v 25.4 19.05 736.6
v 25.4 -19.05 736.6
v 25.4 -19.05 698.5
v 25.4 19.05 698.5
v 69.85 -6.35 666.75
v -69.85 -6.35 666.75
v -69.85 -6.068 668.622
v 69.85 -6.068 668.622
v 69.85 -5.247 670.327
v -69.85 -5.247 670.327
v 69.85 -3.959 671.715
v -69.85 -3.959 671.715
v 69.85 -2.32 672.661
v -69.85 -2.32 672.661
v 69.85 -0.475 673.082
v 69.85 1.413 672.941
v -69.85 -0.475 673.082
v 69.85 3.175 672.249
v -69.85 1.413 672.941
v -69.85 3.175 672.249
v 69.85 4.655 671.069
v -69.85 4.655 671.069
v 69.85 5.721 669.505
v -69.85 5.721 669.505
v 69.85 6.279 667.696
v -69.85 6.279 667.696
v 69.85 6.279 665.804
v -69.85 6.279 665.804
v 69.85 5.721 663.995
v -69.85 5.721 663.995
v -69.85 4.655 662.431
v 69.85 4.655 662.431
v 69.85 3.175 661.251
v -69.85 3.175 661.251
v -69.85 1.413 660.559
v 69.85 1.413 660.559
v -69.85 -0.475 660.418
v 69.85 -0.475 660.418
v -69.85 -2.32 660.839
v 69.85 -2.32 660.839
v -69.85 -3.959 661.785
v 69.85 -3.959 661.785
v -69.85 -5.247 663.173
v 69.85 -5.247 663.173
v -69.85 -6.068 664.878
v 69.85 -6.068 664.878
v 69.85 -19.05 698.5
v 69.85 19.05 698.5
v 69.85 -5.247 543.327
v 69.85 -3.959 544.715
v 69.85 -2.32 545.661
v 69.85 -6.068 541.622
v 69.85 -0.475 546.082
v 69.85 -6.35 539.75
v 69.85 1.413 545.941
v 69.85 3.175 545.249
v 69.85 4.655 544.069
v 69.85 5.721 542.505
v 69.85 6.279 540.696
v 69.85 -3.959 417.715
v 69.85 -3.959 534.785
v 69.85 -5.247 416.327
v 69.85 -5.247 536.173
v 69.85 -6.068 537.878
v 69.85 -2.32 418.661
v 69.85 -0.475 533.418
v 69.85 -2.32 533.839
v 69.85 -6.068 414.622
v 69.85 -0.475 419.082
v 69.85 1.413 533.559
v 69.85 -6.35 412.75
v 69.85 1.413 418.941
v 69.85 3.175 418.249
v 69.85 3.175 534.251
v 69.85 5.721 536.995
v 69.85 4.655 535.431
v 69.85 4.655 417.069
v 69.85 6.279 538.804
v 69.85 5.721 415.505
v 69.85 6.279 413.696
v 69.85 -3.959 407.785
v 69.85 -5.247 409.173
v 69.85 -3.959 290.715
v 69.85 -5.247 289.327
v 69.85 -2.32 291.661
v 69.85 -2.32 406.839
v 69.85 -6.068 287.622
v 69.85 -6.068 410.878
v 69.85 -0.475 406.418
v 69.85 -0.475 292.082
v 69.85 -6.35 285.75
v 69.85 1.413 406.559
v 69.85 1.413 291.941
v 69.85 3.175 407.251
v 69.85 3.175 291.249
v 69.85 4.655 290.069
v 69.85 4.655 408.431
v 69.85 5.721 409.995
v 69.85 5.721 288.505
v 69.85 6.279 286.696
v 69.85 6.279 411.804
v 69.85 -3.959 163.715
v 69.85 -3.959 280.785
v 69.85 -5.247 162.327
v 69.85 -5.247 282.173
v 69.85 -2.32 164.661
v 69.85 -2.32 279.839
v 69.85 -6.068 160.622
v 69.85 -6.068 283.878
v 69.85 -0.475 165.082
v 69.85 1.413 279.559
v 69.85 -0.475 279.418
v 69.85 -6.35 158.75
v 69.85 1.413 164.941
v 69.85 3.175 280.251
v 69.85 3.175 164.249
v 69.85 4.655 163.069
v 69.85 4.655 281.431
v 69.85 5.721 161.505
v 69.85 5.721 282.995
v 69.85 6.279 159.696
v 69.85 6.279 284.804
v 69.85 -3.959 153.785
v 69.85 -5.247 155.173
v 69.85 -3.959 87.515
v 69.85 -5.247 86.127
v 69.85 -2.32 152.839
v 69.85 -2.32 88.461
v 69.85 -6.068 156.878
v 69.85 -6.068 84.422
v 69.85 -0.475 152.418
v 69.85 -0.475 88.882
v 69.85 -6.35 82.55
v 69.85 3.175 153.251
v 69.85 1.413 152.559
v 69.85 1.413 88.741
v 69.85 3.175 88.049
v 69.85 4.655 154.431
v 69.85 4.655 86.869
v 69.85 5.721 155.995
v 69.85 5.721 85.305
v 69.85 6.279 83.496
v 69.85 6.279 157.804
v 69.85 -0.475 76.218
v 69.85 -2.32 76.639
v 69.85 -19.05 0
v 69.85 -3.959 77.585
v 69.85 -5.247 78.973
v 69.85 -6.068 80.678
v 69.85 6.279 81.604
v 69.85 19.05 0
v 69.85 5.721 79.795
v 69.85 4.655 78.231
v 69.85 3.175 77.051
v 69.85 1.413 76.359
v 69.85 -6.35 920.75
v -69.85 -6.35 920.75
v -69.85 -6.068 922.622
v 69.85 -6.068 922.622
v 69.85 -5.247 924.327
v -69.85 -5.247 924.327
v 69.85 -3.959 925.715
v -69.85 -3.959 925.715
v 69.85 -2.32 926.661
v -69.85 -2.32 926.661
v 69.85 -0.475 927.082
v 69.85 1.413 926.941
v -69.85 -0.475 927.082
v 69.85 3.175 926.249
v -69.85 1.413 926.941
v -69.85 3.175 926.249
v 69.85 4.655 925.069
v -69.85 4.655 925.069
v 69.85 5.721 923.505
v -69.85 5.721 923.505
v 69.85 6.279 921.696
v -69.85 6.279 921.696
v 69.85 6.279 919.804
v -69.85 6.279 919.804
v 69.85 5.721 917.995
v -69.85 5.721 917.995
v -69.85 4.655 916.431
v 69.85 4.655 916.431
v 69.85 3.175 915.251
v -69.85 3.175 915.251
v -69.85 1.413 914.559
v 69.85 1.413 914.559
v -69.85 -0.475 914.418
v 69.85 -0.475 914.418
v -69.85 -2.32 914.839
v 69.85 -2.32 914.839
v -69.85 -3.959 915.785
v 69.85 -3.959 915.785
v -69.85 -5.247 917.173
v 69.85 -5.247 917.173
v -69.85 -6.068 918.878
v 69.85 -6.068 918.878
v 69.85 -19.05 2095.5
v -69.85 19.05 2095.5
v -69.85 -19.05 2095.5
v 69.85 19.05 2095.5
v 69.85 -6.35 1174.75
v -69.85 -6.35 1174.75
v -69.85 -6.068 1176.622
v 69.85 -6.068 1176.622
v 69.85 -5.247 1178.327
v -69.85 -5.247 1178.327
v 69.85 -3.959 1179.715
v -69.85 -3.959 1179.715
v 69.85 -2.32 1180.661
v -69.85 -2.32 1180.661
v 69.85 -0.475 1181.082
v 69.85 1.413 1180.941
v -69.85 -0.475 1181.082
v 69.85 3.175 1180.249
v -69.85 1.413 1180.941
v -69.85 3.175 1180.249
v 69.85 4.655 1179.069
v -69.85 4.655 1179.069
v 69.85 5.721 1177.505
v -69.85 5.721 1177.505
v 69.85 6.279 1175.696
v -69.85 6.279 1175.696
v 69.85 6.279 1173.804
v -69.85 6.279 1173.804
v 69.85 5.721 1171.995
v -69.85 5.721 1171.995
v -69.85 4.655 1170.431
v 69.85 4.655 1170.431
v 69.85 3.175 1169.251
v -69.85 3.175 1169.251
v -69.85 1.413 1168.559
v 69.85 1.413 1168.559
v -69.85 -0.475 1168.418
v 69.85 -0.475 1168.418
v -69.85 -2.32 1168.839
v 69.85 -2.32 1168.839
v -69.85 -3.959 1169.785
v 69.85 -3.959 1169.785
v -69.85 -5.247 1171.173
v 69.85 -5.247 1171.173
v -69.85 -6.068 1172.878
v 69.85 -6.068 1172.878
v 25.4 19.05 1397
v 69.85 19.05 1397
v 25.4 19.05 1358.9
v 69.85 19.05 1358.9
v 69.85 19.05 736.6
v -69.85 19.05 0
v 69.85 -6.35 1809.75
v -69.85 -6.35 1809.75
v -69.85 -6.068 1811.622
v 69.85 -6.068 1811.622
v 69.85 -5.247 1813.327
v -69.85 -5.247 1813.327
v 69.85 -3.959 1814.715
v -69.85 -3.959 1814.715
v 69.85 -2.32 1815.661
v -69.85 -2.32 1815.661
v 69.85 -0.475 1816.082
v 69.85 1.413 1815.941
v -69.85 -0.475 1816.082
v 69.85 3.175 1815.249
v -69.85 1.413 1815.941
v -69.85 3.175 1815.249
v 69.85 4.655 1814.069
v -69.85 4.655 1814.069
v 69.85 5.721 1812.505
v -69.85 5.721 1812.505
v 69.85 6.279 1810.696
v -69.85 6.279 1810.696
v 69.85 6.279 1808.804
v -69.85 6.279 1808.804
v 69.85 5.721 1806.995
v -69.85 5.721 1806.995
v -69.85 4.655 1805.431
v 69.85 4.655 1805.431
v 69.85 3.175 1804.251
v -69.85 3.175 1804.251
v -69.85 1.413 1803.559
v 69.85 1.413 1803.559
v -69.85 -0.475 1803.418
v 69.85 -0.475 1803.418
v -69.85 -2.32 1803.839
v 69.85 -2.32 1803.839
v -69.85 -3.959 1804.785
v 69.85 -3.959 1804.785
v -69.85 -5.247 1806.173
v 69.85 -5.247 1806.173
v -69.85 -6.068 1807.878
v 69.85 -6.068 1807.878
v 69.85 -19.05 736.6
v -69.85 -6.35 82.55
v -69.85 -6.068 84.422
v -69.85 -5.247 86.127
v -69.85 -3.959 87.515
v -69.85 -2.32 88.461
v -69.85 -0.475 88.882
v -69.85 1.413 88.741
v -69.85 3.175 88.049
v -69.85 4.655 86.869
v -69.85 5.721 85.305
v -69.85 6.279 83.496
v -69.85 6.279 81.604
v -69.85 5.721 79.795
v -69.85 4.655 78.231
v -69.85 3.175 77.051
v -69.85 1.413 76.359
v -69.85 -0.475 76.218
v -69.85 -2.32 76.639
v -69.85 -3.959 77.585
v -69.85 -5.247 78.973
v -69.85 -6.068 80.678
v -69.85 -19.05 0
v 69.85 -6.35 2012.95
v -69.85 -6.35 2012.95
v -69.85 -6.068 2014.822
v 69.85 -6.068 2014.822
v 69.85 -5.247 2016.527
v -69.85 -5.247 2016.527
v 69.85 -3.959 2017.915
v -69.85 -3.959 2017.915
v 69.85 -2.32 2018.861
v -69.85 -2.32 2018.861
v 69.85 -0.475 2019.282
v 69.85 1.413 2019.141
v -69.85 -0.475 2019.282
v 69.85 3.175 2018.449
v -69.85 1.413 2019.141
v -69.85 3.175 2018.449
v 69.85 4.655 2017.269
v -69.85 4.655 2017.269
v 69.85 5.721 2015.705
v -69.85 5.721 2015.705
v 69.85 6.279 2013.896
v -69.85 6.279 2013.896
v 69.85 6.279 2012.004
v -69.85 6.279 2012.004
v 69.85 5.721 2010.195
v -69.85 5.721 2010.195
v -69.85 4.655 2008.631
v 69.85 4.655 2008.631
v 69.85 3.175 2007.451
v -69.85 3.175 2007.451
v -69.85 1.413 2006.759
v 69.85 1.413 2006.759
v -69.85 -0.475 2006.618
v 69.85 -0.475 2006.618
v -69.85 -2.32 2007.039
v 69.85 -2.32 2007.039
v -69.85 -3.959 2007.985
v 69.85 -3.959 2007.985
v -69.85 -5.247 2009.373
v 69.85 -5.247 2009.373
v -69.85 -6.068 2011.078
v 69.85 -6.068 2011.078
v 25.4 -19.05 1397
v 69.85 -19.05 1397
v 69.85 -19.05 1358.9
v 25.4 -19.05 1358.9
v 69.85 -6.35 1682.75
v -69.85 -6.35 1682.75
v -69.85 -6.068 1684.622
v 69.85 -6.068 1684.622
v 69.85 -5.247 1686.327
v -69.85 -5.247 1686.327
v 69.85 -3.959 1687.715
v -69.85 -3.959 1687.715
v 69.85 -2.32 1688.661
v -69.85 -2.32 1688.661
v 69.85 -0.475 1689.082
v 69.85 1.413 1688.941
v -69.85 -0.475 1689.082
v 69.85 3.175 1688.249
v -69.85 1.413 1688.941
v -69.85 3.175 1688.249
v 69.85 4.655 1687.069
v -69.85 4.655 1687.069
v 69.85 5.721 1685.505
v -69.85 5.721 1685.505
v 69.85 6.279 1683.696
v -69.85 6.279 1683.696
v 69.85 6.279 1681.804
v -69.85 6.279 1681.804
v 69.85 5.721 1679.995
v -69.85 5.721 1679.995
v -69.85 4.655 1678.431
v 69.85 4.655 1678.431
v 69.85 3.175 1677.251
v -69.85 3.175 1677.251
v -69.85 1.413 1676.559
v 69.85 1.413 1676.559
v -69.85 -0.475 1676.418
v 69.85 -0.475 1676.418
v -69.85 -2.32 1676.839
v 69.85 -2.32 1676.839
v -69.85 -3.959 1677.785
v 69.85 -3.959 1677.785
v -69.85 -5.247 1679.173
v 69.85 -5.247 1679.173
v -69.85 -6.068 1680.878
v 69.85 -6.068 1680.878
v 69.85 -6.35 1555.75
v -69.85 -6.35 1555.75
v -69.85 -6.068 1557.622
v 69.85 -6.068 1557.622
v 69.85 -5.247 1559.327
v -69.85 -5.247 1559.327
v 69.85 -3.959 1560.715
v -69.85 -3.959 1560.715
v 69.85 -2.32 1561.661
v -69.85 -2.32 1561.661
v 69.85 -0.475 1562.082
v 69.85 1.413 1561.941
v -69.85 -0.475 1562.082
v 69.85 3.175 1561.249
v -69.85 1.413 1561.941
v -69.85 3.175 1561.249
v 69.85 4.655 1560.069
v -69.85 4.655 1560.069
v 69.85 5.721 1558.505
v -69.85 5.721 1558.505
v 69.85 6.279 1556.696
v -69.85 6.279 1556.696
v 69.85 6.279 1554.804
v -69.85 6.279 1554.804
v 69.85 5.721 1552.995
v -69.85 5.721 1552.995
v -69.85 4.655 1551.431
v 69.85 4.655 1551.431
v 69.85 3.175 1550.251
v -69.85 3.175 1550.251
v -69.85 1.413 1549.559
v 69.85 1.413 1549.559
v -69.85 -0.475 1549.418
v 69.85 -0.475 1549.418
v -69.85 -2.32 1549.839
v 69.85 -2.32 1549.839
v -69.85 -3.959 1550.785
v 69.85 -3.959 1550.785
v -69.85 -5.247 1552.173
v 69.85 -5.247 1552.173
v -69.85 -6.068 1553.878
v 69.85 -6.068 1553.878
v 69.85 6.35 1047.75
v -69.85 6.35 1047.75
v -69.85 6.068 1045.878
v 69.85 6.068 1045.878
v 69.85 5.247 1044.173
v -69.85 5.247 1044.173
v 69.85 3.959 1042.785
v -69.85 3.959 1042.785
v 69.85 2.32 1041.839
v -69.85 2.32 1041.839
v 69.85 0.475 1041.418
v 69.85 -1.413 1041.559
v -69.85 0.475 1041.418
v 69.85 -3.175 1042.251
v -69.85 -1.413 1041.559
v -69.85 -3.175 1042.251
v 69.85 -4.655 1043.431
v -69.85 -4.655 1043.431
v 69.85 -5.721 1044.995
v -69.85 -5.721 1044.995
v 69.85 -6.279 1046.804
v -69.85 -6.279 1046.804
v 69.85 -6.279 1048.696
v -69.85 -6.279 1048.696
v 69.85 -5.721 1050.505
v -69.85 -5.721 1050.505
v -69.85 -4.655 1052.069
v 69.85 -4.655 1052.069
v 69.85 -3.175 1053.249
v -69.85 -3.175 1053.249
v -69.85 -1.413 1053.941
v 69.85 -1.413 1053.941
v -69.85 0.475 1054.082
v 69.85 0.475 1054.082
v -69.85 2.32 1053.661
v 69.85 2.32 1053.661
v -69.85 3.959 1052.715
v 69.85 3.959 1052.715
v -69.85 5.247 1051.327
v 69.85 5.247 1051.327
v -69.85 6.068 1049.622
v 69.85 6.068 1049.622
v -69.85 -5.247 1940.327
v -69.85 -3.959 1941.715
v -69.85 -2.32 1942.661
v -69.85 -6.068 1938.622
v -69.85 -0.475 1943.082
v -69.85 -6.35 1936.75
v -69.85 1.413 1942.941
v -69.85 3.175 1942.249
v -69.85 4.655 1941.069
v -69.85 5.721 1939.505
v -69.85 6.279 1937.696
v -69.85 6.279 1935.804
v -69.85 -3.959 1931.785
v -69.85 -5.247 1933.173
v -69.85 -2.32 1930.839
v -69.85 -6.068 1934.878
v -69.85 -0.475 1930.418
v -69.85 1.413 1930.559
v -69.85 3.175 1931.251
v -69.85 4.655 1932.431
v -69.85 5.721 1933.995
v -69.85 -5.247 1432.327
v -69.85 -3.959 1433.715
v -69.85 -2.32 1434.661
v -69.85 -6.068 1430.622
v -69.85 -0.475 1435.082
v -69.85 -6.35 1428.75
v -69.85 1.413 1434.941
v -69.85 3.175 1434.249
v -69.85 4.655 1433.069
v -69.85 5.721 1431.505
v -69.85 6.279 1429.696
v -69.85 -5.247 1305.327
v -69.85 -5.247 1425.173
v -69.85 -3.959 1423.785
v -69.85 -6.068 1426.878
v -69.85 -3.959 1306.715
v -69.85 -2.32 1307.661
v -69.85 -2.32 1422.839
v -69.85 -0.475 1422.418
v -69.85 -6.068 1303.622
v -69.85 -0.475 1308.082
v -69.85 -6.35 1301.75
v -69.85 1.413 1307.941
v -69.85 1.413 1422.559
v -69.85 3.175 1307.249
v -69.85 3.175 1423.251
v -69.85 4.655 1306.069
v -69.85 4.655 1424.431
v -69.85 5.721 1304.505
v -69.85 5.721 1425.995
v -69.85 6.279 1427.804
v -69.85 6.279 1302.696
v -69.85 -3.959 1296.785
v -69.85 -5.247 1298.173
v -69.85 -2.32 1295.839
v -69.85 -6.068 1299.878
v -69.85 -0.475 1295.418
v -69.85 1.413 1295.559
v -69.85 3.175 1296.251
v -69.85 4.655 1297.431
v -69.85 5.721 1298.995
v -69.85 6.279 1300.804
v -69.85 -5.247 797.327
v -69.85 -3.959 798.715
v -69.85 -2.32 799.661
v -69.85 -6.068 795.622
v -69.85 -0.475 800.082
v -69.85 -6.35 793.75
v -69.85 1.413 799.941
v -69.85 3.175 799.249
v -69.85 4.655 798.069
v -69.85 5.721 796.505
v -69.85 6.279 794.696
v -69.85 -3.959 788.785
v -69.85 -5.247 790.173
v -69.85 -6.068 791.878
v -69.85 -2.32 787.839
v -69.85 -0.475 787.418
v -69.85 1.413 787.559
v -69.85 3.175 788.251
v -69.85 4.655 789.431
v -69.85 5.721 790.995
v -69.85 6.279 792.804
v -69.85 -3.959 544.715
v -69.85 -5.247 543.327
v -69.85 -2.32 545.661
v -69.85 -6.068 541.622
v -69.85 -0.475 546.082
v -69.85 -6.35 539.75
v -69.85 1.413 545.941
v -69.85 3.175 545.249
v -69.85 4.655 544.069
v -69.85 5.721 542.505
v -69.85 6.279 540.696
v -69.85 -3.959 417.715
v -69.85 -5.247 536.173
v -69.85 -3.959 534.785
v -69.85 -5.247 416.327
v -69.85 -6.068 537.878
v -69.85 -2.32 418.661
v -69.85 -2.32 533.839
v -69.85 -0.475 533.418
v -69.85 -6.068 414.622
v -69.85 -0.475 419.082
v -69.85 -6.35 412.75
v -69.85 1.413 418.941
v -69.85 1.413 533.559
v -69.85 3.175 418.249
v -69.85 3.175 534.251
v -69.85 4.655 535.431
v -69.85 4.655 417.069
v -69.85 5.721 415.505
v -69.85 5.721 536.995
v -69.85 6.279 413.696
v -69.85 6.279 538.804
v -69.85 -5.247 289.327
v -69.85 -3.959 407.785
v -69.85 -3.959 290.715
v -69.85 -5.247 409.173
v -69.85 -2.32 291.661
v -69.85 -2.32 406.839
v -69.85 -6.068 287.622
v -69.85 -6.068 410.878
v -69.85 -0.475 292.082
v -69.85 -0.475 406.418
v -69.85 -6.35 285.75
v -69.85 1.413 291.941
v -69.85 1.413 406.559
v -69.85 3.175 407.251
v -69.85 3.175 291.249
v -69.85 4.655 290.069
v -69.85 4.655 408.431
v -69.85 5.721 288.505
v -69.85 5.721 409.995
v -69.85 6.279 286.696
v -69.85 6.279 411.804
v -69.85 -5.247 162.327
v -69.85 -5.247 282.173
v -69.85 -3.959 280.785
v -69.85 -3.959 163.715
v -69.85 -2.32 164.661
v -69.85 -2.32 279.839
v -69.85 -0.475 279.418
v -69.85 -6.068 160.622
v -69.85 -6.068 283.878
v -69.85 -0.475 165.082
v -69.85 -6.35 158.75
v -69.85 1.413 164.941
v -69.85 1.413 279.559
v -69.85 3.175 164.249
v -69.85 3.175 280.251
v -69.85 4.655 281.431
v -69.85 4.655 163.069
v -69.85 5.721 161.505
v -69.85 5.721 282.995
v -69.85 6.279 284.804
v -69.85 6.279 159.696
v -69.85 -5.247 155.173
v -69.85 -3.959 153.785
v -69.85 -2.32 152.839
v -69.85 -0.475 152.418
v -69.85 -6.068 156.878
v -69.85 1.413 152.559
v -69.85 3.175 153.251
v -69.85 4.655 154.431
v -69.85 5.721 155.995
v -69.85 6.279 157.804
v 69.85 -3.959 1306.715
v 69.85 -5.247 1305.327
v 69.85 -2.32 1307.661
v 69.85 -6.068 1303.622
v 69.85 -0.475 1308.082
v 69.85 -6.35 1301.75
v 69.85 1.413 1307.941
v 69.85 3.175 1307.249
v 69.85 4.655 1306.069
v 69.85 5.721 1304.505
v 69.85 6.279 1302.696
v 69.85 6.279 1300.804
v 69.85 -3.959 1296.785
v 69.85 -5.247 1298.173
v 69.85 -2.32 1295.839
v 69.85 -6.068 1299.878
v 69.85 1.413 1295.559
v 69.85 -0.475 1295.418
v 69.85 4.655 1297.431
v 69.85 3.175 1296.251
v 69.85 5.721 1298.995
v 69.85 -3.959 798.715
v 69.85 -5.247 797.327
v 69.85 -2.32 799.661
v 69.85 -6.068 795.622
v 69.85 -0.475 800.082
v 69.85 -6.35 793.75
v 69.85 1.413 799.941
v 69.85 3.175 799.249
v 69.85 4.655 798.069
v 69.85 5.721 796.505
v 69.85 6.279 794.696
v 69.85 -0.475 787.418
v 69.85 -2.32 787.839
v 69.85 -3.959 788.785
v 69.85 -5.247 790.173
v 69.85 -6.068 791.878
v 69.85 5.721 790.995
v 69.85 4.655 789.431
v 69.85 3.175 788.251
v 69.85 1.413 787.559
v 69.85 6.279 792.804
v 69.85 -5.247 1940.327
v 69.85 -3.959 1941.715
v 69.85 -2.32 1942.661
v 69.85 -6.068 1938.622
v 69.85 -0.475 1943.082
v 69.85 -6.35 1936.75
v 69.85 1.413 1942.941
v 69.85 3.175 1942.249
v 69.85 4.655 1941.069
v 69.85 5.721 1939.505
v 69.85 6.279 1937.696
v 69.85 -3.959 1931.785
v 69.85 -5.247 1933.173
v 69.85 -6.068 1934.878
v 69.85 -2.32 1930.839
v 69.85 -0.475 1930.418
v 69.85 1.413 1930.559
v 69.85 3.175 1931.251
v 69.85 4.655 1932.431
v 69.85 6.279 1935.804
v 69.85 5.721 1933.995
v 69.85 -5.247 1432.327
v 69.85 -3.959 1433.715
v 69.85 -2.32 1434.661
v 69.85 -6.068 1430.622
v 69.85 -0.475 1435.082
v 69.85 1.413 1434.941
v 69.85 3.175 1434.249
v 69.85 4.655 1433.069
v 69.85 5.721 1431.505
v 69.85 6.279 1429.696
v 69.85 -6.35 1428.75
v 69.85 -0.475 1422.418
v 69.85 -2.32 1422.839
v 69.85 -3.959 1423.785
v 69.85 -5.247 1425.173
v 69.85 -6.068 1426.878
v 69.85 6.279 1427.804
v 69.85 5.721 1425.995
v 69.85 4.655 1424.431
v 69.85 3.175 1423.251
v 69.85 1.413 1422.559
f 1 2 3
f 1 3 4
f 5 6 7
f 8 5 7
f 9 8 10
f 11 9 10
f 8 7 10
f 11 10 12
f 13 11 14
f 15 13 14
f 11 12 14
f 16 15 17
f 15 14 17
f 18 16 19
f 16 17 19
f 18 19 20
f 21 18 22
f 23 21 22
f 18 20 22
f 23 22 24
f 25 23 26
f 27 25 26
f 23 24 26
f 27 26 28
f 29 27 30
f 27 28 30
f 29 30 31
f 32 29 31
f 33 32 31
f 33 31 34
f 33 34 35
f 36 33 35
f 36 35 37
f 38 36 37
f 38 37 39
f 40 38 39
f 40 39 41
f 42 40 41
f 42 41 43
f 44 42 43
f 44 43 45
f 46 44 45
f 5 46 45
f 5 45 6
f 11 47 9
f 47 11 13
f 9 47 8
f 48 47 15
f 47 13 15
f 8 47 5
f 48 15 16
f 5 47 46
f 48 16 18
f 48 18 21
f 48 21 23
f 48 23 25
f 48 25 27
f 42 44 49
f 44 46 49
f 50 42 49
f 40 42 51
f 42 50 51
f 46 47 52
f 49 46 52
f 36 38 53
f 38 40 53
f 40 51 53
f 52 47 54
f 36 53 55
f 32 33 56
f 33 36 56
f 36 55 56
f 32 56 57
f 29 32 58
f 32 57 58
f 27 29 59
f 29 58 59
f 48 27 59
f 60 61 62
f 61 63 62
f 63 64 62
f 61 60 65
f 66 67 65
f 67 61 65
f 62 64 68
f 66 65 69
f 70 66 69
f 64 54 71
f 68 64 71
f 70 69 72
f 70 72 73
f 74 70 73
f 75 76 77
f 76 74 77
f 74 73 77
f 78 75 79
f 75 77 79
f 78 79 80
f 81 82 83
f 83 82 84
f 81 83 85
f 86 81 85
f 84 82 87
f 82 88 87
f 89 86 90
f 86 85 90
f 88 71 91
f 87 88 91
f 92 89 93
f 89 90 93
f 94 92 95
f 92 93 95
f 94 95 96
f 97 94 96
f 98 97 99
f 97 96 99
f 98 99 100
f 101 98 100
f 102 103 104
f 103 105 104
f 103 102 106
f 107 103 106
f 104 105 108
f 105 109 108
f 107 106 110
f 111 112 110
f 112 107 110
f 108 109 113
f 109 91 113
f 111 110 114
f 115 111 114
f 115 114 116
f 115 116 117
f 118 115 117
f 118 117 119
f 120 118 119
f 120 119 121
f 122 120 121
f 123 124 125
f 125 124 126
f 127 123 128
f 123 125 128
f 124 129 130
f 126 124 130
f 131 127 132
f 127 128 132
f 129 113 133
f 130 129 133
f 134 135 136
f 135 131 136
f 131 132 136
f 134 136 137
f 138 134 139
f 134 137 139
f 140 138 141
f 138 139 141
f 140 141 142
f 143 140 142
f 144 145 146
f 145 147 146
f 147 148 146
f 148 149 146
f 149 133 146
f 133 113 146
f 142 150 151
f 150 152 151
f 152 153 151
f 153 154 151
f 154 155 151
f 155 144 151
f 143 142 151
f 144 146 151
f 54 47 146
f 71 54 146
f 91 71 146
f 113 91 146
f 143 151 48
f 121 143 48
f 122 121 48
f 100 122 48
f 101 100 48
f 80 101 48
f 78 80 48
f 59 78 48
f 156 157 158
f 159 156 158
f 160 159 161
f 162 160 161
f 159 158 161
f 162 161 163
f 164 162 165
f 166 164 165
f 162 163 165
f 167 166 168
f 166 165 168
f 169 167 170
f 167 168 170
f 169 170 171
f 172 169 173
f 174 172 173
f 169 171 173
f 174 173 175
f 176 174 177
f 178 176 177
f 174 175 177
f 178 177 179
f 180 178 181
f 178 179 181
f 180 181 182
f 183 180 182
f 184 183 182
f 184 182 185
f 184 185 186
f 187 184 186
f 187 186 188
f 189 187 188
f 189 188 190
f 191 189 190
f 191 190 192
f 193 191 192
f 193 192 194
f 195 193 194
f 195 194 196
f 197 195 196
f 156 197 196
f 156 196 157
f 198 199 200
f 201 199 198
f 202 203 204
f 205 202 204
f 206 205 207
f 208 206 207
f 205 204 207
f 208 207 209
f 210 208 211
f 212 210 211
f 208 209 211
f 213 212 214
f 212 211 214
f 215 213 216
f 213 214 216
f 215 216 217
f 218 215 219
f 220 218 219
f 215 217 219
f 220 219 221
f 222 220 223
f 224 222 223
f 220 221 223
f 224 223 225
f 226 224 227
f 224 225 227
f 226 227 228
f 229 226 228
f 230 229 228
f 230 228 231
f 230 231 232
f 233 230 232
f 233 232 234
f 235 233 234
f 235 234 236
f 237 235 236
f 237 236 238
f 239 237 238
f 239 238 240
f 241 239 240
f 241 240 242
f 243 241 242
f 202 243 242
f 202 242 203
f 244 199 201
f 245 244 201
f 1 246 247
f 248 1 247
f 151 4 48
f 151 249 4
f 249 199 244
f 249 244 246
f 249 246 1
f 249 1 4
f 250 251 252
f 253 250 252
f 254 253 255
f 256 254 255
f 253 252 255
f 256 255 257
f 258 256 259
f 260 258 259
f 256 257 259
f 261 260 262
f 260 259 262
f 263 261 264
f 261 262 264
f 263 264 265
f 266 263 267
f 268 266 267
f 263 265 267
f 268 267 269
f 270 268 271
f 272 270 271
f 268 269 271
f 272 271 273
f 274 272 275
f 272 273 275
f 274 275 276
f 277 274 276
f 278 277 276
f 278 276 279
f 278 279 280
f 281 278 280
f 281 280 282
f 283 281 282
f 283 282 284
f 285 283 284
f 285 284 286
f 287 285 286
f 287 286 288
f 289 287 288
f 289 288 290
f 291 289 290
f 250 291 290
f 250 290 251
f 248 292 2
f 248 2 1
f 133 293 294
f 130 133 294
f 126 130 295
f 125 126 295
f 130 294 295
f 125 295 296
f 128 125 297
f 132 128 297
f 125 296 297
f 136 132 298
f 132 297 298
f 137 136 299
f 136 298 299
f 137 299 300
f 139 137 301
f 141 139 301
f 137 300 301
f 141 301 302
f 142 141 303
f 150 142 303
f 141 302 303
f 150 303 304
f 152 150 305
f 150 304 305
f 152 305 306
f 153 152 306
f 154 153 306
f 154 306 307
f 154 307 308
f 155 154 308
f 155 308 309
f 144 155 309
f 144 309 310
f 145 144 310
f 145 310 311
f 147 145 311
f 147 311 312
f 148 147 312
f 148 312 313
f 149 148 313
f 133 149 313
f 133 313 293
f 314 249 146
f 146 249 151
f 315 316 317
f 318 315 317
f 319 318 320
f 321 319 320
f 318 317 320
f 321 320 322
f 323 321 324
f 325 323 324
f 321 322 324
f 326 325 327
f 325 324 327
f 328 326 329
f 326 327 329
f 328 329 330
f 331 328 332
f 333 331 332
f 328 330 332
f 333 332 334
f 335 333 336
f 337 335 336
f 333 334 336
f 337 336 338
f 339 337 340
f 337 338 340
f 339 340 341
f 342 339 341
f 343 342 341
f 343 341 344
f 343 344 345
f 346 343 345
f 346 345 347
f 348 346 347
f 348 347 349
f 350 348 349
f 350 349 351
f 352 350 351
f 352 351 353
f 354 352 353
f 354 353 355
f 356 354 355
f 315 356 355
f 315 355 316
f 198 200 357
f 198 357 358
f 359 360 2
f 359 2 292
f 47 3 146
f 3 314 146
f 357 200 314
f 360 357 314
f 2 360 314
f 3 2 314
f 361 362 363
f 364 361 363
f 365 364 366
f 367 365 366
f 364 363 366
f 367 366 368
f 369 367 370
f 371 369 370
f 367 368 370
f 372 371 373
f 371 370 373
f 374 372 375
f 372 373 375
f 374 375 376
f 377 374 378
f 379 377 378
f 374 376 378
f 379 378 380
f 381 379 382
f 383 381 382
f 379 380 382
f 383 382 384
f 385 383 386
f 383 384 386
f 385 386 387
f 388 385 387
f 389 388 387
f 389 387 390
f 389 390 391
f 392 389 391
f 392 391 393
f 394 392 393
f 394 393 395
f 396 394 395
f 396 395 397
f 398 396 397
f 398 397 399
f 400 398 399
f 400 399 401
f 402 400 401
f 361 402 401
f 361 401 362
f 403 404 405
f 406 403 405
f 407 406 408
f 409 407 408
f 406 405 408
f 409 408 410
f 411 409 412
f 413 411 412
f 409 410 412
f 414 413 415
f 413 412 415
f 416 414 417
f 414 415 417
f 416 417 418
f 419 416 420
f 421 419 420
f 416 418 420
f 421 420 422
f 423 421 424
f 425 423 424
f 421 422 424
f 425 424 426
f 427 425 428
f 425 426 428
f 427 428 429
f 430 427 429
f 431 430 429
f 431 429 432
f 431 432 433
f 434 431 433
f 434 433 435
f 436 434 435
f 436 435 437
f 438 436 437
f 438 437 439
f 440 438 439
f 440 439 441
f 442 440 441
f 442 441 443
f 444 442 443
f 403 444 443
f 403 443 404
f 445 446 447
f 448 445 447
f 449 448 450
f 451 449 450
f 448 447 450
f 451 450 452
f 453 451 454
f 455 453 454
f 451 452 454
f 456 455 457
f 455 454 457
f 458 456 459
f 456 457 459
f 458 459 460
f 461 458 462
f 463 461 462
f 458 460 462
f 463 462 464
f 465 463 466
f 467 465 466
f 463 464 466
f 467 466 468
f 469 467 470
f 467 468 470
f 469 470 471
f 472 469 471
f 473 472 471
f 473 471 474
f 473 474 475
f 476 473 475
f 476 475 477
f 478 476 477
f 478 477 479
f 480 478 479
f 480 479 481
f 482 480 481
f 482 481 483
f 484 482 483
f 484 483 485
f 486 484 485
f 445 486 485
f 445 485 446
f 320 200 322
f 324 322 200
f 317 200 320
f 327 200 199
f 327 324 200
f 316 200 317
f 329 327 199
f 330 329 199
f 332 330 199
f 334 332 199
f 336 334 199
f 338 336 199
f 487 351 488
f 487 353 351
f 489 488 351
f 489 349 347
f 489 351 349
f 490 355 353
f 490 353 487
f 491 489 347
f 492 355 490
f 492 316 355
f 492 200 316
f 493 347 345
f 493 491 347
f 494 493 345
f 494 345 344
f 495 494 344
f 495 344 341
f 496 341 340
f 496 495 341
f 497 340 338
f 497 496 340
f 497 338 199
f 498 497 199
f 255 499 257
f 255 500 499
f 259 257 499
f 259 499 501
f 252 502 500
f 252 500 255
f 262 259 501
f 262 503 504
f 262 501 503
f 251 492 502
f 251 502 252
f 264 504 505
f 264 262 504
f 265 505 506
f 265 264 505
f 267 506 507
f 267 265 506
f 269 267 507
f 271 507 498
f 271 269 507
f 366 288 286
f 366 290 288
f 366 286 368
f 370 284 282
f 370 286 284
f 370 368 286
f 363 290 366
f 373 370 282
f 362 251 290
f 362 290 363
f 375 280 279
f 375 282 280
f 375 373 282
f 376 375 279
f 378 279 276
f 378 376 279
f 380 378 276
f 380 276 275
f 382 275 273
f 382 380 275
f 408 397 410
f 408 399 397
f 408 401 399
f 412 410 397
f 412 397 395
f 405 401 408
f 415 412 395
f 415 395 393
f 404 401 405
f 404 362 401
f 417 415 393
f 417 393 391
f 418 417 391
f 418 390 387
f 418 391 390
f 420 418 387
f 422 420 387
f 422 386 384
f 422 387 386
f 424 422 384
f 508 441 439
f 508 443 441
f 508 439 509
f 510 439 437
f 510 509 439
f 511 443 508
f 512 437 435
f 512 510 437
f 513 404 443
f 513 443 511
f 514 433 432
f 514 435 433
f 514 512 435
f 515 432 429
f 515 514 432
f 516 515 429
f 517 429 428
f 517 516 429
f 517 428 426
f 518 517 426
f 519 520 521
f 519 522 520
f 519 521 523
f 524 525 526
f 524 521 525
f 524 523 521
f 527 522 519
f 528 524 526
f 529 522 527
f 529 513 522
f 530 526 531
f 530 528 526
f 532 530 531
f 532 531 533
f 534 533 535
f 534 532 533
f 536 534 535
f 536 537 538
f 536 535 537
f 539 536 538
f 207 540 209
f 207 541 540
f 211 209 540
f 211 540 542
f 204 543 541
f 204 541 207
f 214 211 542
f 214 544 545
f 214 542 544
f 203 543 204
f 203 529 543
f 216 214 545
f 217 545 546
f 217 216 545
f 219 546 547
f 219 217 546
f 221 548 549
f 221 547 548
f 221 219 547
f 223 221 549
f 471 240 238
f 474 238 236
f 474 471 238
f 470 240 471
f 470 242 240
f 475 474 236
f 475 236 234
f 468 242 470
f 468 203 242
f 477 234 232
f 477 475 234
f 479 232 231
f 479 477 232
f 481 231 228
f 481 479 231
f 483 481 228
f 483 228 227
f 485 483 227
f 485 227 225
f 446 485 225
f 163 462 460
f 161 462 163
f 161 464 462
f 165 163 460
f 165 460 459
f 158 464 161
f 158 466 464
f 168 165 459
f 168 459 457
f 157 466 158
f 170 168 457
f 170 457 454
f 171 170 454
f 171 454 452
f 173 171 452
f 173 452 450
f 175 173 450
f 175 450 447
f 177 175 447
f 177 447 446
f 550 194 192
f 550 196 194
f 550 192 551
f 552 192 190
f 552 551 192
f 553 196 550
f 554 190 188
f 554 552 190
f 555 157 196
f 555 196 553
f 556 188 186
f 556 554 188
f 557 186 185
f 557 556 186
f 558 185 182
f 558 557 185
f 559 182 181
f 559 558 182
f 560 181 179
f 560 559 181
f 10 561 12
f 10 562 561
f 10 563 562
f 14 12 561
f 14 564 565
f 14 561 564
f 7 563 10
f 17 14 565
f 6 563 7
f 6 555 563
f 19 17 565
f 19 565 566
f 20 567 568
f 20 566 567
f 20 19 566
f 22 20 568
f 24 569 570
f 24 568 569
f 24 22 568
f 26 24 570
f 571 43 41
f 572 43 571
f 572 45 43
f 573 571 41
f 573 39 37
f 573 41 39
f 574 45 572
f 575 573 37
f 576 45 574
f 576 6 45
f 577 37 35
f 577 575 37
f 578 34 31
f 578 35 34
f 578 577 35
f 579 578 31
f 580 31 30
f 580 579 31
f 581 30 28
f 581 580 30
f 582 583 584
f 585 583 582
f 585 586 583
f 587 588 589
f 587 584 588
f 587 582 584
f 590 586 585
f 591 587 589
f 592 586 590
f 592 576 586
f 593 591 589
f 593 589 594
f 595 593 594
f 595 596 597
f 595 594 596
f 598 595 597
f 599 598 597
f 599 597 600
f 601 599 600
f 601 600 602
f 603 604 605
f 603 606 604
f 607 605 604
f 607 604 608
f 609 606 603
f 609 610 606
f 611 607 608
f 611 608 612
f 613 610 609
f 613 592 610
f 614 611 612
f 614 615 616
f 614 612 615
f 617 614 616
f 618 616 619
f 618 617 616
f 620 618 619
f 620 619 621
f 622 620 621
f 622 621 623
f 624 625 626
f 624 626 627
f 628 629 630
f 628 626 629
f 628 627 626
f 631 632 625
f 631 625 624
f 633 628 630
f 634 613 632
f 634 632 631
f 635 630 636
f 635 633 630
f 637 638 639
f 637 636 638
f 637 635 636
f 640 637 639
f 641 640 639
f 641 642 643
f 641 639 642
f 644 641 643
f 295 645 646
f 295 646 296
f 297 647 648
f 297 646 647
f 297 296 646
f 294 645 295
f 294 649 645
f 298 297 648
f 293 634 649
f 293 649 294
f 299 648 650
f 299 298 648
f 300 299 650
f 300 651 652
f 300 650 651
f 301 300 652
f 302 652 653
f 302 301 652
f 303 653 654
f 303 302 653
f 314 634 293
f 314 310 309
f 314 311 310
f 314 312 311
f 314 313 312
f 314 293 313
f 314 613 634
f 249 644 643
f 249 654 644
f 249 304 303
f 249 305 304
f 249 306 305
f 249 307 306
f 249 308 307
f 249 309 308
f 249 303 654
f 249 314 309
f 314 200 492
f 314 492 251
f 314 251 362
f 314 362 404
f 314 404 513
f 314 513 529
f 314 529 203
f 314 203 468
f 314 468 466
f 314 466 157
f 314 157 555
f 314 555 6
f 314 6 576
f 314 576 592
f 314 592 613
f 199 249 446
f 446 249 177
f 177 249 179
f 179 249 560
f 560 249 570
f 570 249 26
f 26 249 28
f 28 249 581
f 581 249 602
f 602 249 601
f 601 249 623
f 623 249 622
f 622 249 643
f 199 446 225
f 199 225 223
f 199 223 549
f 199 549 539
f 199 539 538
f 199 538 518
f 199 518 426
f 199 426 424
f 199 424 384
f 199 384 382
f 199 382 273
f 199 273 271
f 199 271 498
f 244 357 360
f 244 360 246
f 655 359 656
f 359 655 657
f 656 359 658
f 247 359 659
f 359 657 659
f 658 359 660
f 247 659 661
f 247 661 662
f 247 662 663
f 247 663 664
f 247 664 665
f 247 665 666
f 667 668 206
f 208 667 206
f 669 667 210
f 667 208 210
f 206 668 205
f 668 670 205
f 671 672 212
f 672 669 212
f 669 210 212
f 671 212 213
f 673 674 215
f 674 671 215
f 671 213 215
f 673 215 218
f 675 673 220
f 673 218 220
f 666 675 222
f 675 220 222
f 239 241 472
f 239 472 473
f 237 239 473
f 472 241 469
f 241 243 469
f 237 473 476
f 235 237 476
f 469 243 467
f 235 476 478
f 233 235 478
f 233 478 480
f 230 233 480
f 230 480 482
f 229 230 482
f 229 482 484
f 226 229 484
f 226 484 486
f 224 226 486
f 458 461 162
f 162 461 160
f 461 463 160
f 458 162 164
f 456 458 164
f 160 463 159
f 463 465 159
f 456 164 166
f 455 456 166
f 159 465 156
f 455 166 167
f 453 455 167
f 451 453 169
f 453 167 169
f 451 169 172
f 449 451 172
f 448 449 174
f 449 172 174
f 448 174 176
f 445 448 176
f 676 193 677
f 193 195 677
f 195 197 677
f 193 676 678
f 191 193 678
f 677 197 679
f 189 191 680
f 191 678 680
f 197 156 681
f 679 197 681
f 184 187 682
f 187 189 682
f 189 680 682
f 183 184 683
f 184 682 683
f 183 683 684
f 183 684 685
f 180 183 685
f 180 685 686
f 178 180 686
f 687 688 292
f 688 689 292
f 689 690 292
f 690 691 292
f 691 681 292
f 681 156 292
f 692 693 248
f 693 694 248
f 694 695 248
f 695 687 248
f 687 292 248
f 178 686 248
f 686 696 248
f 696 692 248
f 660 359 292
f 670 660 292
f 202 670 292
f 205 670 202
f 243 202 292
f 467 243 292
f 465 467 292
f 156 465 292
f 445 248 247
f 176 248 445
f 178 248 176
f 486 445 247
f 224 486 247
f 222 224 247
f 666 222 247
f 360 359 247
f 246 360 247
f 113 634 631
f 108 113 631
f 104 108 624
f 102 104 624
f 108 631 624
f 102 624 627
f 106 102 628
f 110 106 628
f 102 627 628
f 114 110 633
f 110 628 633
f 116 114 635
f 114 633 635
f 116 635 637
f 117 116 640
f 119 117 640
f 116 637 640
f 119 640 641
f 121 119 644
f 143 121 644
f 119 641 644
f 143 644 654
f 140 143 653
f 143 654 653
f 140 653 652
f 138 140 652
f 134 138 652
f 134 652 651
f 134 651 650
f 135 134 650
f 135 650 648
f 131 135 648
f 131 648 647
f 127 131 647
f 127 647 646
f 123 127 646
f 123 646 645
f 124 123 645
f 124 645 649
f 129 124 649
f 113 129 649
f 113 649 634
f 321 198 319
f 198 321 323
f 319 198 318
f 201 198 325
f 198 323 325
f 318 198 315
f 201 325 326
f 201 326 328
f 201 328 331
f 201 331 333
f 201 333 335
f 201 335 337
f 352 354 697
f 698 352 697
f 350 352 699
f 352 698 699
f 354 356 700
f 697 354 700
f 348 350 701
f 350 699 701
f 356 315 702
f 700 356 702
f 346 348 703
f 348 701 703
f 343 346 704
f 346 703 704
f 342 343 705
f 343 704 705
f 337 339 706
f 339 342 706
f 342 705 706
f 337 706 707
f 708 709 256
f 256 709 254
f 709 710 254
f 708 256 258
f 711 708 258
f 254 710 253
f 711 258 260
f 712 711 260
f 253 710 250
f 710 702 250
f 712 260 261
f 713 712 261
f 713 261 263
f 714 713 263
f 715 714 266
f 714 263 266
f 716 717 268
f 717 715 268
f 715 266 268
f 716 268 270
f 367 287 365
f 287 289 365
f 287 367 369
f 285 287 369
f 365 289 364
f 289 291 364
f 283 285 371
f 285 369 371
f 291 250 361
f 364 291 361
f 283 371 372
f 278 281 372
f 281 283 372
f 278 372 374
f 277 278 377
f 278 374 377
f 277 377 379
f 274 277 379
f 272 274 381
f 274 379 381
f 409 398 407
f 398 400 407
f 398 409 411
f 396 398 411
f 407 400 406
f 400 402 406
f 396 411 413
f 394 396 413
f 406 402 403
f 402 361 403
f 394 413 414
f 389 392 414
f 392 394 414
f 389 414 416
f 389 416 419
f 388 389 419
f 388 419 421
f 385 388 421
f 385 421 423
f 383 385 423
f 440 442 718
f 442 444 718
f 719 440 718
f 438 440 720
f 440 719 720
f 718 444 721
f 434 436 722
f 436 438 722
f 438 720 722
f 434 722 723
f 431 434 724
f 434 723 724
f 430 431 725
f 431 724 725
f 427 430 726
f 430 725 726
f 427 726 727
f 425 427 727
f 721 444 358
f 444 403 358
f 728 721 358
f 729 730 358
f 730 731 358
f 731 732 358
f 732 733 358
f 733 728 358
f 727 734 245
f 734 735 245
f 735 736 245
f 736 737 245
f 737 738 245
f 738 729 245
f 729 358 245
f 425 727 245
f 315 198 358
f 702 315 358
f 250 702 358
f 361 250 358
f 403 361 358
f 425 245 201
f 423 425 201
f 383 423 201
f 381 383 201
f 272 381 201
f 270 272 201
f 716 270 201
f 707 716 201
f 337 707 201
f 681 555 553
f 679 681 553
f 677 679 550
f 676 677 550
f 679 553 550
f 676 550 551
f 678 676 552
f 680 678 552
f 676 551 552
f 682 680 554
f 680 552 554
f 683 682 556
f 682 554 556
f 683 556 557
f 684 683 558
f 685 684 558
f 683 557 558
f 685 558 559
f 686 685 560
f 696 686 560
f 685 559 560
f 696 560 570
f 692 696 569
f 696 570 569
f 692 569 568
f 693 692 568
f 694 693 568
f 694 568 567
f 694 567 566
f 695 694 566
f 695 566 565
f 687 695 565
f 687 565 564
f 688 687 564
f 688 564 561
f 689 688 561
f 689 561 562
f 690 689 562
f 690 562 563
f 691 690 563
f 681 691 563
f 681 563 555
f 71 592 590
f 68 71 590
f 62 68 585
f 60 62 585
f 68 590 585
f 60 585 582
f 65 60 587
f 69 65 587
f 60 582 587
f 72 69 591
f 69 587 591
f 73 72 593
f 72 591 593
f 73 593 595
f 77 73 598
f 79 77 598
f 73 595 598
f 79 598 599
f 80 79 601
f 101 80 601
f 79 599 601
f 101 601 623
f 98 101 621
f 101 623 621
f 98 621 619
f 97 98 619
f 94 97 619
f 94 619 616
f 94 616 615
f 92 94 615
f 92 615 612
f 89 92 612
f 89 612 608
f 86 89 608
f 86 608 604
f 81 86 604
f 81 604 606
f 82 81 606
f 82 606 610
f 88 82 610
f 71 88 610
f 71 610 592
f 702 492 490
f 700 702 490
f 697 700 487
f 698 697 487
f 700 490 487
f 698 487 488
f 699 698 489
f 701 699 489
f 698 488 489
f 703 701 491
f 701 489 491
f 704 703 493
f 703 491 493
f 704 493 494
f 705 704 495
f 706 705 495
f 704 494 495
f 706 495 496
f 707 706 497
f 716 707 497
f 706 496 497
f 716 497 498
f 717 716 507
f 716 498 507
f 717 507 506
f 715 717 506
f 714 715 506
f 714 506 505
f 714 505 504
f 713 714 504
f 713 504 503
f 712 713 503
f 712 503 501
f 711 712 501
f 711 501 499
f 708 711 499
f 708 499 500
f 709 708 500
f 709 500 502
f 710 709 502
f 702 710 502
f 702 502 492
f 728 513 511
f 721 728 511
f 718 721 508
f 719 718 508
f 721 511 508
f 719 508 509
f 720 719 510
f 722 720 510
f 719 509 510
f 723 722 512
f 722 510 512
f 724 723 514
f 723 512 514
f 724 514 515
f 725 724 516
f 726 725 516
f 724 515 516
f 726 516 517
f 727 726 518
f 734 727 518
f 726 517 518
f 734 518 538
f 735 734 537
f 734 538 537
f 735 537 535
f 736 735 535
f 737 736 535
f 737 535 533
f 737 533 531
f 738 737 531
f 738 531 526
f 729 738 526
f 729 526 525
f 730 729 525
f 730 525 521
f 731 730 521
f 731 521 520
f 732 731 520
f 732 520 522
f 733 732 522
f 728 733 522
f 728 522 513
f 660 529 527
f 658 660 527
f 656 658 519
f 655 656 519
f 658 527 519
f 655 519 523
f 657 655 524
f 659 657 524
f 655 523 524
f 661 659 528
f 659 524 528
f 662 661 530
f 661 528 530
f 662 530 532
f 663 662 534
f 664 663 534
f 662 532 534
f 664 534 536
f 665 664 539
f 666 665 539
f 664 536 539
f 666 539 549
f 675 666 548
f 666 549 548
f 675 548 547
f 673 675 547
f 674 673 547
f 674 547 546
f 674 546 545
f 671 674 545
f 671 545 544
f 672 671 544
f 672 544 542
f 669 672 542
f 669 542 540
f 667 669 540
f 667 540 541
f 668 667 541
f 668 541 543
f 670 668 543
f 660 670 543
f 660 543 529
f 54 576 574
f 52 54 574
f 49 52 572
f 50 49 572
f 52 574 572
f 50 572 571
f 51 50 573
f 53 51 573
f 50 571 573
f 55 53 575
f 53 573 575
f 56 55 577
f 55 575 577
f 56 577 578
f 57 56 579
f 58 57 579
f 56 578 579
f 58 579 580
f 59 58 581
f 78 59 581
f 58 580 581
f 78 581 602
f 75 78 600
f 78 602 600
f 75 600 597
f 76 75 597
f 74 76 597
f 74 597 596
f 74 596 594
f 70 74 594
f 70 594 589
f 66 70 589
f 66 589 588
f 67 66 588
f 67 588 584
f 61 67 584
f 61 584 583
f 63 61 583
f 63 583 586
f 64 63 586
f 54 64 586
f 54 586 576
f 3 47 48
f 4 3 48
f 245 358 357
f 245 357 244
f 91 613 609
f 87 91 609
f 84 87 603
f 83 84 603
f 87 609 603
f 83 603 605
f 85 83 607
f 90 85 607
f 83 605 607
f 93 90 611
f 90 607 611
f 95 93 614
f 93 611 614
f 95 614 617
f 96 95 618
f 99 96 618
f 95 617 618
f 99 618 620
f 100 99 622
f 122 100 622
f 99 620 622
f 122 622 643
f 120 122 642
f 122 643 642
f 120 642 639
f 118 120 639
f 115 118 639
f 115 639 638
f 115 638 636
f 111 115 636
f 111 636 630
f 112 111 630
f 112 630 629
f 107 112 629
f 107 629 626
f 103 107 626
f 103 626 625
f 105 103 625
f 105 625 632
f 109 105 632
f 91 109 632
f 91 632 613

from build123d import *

# Parameters (mm, degrees)
F0_W     = 139.7
F0_H     = 38.1
F1_DEPTH = 2095.5
F2_R     = 6.35
F3_DEPTH = 152.4
F4_W     = 38.1
F4_H     = 38.1
F5_DEPTH = 44.45


with BuildPart() as f1:
    # F0 (on Top) → F1 (new body)
    with BuildSketch(Plane.XY):
        Rectangle(F0_W, F0_H)
    extrude(amount=F1_DEPTH)

    # F2 (on face) → F3 (cut)
    with BuildSketch(Plane(origin=(-69.85, 0, 0), x_dir=(0, -1, 0), z_dir=(-1, 0, 0))):
        with BuildLine():
            ThreePointArc((6.35, 1047.75), (0, 1054.1), (-6.35, 1047.75))
            Line((-6.35, 1047.75), (6.35, 1047.75))
        make_face()
        with BuildLine():
            Line((6.35, 1047.75), (-6.35, 1047.75))
            ThreePointArc((-6.35, 1047.75), (0, 1041.4), (6.35, 1047.75))
        make_face()
        with Locations((0, 1174.75)):
            Circle(F2_R)
        with Locations((0, 1301.75)):
            Circle(F2_R)
        with Locations((0, 1428.75)):
            Circle(F2_R)
        with Locations((0, 1555.75)):
            Circle(F2_R)
        with Locations((0, 1682.75)):
            Circle(F2_R)
        with Locations((0, 1809.75)):
            Circle(F2_R)
        with Locations((0, 1936.75)):
            Circle(F2_R)
        with Locations((0, 920.75)):
            Circle(F2_R)
        with Locations((0, 666.75)):
            Circle(F2_R)
        with Locations((0, 539.75)):
            Circle(F2_R)
        with Locations((0, 412.75)):
            Circle(F2_R)
        with Locations((0, 285.75)):
            Circle(F2_R)
        with Locations((0, 158.75)):
            Circle(F2_R)
        with Locations((0, 793.75)):
            Circle(F2_R)
        with Locations((0, 2012.95)):
            Circle(F2_R)
        with Locations((0, 82.55)):
            Circle(F2_R)
    extrude(amount=-F3_DEPTH, mode=Mode.SUBTRACT)

    # F4 (on face) → F5 (cut)
    with BuildSketch(Plane.YZ.offset(69.85)):
        with Locations((0, 717.55)):
            Rectangle(F4_W, F4_H)
        with Locations((0, 1377.95)):
            Rectangle(F4_W, F4_H)
    extrude(amount=-F5_DEPTH, mode=Mode.SUBTRACT)


solid = f1.part
